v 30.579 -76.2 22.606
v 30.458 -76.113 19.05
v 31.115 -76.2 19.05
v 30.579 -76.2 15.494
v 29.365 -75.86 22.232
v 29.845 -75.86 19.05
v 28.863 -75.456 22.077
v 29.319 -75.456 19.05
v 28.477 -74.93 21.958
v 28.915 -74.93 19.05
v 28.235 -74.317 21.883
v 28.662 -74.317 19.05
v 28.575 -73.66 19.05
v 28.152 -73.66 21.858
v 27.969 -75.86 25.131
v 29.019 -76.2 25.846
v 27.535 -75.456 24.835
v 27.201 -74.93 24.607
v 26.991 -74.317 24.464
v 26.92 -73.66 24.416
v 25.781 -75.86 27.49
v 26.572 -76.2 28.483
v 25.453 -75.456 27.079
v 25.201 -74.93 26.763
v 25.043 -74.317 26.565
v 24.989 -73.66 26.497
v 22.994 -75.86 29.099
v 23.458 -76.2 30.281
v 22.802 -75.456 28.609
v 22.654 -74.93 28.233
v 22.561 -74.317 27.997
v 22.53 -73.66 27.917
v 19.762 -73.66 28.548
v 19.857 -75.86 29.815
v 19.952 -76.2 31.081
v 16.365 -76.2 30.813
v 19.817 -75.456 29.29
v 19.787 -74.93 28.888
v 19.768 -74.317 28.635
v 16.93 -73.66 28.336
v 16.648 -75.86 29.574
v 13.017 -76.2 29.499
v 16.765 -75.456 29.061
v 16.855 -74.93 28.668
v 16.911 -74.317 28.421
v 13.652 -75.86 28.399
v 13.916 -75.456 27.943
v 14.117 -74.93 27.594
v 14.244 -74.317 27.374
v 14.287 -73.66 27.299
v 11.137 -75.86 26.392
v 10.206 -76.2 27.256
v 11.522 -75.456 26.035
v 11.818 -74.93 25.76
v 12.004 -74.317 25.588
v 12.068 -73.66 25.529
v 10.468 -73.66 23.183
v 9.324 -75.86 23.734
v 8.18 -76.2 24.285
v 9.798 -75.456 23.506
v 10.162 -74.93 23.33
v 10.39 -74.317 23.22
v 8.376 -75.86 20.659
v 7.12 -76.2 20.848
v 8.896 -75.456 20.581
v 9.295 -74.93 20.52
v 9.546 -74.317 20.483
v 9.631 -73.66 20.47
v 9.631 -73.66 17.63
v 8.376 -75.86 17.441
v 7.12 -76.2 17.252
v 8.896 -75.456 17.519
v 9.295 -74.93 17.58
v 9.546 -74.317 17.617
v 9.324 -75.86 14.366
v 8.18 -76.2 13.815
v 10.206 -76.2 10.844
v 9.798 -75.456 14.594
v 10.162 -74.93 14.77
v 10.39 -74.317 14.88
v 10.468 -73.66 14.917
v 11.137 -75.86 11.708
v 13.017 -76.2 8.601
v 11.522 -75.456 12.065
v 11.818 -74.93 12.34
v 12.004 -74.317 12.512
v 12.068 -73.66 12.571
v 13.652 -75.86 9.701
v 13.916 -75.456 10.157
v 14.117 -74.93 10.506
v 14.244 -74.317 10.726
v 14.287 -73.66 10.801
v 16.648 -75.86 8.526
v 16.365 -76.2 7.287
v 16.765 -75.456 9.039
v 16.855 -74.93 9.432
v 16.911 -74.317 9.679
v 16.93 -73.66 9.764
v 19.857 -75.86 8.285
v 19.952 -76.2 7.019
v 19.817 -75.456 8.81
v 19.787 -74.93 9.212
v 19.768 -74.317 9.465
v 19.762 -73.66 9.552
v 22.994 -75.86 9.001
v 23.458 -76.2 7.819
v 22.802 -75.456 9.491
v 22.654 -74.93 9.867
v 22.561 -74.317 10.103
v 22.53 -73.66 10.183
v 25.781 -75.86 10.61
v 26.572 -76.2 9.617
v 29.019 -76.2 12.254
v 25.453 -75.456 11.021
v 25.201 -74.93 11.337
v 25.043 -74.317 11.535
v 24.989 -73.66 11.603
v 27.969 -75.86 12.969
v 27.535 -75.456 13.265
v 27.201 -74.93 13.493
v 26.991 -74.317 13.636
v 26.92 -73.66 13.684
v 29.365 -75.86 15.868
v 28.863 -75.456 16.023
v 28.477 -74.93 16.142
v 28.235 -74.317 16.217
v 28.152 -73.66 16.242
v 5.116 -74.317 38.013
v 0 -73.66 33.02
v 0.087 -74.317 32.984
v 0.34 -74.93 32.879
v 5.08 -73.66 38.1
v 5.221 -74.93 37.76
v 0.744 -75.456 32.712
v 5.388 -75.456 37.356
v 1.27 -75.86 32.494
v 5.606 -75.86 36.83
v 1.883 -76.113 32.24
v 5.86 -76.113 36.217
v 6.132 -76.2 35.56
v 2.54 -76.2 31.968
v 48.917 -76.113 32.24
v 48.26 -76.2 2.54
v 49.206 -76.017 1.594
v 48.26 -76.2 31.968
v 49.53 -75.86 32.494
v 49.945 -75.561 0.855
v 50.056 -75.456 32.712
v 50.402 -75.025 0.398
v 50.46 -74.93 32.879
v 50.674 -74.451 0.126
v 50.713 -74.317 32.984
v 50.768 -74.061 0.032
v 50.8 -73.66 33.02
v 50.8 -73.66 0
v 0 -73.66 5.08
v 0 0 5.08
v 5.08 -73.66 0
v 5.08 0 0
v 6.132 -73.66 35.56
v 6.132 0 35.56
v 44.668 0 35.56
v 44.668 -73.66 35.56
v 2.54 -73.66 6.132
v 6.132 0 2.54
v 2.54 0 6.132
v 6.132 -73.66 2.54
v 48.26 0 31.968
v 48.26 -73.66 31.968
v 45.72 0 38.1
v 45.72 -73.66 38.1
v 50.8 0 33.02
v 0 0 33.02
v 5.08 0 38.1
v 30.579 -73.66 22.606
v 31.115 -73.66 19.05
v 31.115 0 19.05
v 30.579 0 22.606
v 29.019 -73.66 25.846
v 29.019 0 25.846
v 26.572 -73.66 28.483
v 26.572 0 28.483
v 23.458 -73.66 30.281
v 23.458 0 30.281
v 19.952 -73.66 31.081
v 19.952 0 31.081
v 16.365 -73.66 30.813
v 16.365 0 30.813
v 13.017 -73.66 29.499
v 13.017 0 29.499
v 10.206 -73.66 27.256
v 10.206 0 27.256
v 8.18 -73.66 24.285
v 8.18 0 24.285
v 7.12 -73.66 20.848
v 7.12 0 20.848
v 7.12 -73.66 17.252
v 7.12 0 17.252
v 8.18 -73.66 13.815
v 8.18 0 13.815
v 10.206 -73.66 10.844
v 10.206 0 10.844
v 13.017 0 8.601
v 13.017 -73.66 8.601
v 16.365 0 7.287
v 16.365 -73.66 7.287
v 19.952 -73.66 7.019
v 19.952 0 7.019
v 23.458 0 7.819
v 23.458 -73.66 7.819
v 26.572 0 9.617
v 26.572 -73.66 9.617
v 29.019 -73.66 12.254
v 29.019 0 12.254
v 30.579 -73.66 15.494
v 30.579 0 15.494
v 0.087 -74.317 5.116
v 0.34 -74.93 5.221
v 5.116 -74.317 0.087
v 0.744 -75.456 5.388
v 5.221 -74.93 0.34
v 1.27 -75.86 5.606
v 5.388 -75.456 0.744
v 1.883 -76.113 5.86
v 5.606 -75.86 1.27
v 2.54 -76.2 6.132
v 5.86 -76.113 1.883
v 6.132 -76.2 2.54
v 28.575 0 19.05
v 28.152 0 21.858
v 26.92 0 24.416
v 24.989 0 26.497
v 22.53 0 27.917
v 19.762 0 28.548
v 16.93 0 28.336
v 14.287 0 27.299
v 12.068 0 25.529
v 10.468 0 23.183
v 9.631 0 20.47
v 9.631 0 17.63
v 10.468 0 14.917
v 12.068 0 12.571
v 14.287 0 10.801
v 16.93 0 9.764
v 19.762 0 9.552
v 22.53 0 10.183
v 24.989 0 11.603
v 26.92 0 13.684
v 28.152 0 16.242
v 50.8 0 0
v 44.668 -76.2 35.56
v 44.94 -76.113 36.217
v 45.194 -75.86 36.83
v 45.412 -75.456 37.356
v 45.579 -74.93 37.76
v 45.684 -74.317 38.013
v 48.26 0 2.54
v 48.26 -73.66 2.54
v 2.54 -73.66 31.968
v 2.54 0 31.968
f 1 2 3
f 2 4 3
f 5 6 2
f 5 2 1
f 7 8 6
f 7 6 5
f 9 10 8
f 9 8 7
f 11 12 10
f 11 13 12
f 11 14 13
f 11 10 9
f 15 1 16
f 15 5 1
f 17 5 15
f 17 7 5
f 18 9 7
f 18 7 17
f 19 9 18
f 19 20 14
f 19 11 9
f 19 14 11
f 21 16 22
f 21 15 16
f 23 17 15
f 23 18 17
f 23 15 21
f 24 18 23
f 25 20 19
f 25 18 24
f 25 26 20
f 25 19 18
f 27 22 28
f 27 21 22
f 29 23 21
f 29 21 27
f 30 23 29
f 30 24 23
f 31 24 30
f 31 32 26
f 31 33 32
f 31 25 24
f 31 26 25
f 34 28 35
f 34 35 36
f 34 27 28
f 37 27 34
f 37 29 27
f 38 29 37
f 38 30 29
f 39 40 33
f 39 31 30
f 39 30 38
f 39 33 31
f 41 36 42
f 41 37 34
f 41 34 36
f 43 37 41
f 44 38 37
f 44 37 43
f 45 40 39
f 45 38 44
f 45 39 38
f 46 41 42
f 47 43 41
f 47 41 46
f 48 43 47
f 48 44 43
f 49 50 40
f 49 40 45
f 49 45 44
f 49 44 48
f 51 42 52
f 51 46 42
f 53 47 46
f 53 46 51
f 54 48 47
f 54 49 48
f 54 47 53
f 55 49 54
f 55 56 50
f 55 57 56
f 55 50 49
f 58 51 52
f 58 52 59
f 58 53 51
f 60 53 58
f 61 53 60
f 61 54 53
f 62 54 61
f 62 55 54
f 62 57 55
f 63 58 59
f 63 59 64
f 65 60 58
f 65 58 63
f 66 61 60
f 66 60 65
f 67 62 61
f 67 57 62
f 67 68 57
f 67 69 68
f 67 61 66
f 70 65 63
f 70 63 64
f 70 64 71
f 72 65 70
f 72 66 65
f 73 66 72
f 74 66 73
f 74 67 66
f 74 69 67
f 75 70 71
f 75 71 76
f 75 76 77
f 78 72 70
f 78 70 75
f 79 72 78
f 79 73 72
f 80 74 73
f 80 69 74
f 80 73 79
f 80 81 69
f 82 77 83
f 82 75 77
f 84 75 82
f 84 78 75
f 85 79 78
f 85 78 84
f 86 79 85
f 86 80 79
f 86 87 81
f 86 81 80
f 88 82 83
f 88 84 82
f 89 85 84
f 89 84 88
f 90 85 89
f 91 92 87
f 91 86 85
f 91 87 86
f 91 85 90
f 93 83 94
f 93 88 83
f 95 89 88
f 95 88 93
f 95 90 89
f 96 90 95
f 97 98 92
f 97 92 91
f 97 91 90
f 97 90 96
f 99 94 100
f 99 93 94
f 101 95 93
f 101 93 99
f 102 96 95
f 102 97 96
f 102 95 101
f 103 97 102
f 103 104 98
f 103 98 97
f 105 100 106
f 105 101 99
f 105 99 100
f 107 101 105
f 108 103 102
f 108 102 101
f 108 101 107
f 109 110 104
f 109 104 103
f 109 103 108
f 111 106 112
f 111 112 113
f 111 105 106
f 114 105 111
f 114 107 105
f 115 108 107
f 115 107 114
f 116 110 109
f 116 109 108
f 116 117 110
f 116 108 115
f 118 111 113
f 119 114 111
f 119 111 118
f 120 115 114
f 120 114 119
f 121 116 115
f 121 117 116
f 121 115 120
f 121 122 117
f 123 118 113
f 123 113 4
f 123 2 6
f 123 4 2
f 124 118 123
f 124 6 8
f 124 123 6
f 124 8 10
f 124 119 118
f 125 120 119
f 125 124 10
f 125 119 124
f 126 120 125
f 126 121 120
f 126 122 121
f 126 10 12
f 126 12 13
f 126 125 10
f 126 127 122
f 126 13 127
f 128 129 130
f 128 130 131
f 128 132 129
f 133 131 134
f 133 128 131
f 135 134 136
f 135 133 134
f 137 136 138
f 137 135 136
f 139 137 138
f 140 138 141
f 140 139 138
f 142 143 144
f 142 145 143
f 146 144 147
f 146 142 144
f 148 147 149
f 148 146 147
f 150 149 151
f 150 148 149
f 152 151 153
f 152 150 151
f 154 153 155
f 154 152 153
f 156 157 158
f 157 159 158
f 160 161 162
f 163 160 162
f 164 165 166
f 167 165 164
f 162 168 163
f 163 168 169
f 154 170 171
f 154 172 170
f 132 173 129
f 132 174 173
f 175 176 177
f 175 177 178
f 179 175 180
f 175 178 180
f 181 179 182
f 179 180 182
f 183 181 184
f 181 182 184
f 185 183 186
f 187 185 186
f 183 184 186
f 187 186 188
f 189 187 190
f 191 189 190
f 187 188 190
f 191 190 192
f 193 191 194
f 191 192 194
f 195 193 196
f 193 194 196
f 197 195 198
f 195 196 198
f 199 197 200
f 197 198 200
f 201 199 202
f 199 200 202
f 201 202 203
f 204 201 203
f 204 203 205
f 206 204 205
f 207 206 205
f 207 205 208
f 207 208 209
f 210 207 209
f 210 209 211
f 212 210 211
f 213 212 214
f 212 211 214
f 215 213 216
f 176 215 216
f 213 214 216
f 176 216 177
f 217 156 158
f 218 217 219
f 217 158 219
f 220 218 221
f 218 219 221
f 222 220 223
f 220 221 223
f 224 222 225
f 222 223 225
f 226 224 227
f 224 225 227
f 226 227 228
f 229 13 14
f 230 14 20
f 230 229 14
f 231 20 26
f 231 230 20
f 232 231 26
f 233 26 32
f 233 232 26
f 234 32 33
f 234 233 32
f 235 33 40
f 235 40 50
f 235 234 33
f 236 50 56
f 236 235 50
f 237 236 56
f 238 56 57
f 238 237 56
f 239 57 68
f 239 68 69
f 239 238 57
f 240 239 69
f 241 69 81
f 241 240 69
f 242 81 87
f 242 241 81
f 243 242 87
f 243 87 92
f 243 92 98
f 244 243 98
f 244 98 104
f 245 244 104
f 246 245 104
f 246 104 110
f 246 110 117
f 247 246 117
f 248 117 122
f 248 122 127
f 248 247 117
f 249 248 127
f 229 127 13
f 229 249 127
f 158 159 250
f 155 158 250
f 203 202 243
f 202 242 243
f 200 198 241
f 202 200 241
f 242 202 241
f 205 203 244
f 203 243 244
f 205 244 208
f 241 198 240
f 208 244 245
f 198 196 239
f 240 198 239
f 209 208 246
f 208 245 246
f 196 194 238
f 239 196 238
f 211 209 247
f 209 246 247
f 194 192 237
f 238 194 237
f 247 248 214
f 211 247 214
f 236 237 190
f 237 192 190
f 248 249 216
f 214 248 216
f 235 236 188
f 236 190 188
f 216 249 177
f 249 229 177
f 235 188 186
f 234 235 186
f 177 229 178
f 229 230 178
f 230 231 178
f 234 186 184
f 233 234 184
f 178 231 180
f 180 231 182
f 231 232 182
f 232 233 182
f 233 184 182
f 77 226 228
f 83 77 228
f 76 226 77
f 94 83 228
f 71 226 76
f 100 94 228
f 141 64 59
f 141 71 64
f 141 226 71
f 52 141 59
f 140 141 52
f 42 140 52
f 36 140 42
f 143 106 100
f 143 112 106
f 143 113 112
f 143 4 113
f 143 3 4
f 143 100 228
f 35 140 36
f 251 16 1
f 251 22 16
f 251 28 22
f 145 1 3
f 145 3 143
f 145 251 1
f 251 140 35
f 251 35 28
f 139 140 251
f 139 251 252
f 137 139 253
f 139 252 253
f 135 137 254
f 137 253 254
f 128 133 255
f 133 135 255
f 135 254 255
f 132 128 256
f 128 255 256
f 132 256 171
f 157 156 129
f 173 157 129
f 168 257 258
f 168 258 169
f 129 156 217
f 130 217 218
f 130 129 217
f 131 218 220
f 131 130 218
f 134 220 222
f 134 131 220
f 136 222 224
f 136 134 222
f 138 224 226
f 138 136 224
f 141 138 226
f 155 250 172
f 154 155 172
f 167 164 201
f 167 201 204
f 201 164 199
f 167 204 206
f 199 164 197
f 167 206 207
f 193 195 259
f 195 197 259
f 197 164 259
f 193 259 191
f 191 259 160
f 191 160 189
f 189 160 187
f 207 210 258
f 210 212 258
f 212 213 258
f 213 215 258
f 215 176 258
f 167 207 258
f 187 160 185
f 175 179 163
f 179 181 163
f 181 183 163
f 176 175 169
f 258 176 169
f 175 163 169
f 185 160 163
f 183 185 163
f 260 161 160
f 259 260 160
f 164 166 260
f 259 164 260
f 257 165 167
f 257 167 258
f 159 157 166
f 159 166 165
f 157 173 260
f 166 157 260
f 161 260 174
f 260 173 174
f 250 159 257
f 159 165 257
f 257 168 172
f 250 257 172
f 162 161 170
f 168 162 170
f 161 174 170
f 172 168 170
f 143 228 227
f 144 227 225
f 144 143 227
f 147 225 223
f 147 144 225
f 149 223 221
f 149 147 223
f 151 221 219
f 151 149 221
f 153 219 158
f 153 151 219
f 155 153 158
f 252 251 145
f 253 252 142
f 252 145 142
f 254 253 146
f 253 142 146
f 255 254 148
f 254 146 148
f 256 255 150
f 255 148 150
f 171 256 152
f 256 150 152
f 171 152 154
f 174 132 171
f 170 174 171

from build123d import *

# Parameters (mm, degrees)
F0_W     = 50.8
F0_H     = 38.1
F0_R     = 9.525
F1_DEPTH = 76.2
F2_SIZE  = 5.08
F3_SIZE  = 5.08
F4_R     = 2.54
F5_T     = 2.54


# Not quite as in the source:
# - a shell that OpenCascade refuses in one call is made with other operations: the cavity is built on its own and cut out


with BuildPart() as f1:
    # F0 (on Front) → F1 (new body)
    with BuildSketch(Plane.XZ):
        with Locations((25.4, 19.05)):
            Rectangle(F0_W, F0_H)
        with Locations((19.05, 19.05)):
            Circle(F0_R, mode=Mode.SUBTRACT)
    extrude(amount=F1_DEPTH)

    # F2
    f2_edges = [f1.edges().sort_by_distance(p)[0] for p in [
        (0, -38.1, 0),
    ]]
    chamfer(f2_edges, length=F2_SIZE)

    # F3
    f3_edges = [f1.edges().sort_by_distance(p)[0] for p in [
        (0, -38.1, 38.1),
        (50.8, -38.1, 38.1),
    ]]
    chamfer(f3_edges, length=F3_SIZE)

    # F4
    f4_edges = [f1.edges().sort_by_distance(p)[0] for p in [
        (0, -76.2, 19.05),
        (2.54, -76.2, 35.56),
        (2.54, -76.2, 2.54),
        (25.4, -76.2, 38.1),
        (27.94, -76.2, 0),
        (48.26, -76.2, 35.56),
        (50.8, -76.2, 16.51),
        (9.525, -76.2, 19.05),
    ]]
    fillet(f4_edges, radius=F4_R)

    # F5: shell of thickness 2.54, made by hand


with BuildPart() as f5_core1:
    # F5_t2: copy of F1
    add(f1.part)

    # the walls: a layer under each face that stays
    f5_faces = [f5_core1.faces().sort_by_distance(p)[0] for p in [
        (0, -36.83, 19.05),
        (2.54, -36.83, 35.56),
        (2.54, -36.83, 2.54),
        (25.4, -36.83, 38.1),
        (10.16, -76.2, 8.0433333333),
        (27.94, -36.83, 0),
        (48.26, -36.83, 35.56),
        (50.8, -36.83, 16.51),
        (9.525, -36.83, 19.05),
    ]]
    thicken(f5_faces, amount=-F5_T, mode=Mode.SUBTRACT)


with BuildPart() as f1_1:
    add(f1.part)

    # what is left inside the walls is the cavity
    f5_cavity = [f5_core1.part.solids().sort_by_distance(p)[0] for p in [
        (6.9596, -49.106667, 19.05),
    ]]
    add(f5_cavity, mode=Mode.SUBTRACT)


solid = f1_1.part
